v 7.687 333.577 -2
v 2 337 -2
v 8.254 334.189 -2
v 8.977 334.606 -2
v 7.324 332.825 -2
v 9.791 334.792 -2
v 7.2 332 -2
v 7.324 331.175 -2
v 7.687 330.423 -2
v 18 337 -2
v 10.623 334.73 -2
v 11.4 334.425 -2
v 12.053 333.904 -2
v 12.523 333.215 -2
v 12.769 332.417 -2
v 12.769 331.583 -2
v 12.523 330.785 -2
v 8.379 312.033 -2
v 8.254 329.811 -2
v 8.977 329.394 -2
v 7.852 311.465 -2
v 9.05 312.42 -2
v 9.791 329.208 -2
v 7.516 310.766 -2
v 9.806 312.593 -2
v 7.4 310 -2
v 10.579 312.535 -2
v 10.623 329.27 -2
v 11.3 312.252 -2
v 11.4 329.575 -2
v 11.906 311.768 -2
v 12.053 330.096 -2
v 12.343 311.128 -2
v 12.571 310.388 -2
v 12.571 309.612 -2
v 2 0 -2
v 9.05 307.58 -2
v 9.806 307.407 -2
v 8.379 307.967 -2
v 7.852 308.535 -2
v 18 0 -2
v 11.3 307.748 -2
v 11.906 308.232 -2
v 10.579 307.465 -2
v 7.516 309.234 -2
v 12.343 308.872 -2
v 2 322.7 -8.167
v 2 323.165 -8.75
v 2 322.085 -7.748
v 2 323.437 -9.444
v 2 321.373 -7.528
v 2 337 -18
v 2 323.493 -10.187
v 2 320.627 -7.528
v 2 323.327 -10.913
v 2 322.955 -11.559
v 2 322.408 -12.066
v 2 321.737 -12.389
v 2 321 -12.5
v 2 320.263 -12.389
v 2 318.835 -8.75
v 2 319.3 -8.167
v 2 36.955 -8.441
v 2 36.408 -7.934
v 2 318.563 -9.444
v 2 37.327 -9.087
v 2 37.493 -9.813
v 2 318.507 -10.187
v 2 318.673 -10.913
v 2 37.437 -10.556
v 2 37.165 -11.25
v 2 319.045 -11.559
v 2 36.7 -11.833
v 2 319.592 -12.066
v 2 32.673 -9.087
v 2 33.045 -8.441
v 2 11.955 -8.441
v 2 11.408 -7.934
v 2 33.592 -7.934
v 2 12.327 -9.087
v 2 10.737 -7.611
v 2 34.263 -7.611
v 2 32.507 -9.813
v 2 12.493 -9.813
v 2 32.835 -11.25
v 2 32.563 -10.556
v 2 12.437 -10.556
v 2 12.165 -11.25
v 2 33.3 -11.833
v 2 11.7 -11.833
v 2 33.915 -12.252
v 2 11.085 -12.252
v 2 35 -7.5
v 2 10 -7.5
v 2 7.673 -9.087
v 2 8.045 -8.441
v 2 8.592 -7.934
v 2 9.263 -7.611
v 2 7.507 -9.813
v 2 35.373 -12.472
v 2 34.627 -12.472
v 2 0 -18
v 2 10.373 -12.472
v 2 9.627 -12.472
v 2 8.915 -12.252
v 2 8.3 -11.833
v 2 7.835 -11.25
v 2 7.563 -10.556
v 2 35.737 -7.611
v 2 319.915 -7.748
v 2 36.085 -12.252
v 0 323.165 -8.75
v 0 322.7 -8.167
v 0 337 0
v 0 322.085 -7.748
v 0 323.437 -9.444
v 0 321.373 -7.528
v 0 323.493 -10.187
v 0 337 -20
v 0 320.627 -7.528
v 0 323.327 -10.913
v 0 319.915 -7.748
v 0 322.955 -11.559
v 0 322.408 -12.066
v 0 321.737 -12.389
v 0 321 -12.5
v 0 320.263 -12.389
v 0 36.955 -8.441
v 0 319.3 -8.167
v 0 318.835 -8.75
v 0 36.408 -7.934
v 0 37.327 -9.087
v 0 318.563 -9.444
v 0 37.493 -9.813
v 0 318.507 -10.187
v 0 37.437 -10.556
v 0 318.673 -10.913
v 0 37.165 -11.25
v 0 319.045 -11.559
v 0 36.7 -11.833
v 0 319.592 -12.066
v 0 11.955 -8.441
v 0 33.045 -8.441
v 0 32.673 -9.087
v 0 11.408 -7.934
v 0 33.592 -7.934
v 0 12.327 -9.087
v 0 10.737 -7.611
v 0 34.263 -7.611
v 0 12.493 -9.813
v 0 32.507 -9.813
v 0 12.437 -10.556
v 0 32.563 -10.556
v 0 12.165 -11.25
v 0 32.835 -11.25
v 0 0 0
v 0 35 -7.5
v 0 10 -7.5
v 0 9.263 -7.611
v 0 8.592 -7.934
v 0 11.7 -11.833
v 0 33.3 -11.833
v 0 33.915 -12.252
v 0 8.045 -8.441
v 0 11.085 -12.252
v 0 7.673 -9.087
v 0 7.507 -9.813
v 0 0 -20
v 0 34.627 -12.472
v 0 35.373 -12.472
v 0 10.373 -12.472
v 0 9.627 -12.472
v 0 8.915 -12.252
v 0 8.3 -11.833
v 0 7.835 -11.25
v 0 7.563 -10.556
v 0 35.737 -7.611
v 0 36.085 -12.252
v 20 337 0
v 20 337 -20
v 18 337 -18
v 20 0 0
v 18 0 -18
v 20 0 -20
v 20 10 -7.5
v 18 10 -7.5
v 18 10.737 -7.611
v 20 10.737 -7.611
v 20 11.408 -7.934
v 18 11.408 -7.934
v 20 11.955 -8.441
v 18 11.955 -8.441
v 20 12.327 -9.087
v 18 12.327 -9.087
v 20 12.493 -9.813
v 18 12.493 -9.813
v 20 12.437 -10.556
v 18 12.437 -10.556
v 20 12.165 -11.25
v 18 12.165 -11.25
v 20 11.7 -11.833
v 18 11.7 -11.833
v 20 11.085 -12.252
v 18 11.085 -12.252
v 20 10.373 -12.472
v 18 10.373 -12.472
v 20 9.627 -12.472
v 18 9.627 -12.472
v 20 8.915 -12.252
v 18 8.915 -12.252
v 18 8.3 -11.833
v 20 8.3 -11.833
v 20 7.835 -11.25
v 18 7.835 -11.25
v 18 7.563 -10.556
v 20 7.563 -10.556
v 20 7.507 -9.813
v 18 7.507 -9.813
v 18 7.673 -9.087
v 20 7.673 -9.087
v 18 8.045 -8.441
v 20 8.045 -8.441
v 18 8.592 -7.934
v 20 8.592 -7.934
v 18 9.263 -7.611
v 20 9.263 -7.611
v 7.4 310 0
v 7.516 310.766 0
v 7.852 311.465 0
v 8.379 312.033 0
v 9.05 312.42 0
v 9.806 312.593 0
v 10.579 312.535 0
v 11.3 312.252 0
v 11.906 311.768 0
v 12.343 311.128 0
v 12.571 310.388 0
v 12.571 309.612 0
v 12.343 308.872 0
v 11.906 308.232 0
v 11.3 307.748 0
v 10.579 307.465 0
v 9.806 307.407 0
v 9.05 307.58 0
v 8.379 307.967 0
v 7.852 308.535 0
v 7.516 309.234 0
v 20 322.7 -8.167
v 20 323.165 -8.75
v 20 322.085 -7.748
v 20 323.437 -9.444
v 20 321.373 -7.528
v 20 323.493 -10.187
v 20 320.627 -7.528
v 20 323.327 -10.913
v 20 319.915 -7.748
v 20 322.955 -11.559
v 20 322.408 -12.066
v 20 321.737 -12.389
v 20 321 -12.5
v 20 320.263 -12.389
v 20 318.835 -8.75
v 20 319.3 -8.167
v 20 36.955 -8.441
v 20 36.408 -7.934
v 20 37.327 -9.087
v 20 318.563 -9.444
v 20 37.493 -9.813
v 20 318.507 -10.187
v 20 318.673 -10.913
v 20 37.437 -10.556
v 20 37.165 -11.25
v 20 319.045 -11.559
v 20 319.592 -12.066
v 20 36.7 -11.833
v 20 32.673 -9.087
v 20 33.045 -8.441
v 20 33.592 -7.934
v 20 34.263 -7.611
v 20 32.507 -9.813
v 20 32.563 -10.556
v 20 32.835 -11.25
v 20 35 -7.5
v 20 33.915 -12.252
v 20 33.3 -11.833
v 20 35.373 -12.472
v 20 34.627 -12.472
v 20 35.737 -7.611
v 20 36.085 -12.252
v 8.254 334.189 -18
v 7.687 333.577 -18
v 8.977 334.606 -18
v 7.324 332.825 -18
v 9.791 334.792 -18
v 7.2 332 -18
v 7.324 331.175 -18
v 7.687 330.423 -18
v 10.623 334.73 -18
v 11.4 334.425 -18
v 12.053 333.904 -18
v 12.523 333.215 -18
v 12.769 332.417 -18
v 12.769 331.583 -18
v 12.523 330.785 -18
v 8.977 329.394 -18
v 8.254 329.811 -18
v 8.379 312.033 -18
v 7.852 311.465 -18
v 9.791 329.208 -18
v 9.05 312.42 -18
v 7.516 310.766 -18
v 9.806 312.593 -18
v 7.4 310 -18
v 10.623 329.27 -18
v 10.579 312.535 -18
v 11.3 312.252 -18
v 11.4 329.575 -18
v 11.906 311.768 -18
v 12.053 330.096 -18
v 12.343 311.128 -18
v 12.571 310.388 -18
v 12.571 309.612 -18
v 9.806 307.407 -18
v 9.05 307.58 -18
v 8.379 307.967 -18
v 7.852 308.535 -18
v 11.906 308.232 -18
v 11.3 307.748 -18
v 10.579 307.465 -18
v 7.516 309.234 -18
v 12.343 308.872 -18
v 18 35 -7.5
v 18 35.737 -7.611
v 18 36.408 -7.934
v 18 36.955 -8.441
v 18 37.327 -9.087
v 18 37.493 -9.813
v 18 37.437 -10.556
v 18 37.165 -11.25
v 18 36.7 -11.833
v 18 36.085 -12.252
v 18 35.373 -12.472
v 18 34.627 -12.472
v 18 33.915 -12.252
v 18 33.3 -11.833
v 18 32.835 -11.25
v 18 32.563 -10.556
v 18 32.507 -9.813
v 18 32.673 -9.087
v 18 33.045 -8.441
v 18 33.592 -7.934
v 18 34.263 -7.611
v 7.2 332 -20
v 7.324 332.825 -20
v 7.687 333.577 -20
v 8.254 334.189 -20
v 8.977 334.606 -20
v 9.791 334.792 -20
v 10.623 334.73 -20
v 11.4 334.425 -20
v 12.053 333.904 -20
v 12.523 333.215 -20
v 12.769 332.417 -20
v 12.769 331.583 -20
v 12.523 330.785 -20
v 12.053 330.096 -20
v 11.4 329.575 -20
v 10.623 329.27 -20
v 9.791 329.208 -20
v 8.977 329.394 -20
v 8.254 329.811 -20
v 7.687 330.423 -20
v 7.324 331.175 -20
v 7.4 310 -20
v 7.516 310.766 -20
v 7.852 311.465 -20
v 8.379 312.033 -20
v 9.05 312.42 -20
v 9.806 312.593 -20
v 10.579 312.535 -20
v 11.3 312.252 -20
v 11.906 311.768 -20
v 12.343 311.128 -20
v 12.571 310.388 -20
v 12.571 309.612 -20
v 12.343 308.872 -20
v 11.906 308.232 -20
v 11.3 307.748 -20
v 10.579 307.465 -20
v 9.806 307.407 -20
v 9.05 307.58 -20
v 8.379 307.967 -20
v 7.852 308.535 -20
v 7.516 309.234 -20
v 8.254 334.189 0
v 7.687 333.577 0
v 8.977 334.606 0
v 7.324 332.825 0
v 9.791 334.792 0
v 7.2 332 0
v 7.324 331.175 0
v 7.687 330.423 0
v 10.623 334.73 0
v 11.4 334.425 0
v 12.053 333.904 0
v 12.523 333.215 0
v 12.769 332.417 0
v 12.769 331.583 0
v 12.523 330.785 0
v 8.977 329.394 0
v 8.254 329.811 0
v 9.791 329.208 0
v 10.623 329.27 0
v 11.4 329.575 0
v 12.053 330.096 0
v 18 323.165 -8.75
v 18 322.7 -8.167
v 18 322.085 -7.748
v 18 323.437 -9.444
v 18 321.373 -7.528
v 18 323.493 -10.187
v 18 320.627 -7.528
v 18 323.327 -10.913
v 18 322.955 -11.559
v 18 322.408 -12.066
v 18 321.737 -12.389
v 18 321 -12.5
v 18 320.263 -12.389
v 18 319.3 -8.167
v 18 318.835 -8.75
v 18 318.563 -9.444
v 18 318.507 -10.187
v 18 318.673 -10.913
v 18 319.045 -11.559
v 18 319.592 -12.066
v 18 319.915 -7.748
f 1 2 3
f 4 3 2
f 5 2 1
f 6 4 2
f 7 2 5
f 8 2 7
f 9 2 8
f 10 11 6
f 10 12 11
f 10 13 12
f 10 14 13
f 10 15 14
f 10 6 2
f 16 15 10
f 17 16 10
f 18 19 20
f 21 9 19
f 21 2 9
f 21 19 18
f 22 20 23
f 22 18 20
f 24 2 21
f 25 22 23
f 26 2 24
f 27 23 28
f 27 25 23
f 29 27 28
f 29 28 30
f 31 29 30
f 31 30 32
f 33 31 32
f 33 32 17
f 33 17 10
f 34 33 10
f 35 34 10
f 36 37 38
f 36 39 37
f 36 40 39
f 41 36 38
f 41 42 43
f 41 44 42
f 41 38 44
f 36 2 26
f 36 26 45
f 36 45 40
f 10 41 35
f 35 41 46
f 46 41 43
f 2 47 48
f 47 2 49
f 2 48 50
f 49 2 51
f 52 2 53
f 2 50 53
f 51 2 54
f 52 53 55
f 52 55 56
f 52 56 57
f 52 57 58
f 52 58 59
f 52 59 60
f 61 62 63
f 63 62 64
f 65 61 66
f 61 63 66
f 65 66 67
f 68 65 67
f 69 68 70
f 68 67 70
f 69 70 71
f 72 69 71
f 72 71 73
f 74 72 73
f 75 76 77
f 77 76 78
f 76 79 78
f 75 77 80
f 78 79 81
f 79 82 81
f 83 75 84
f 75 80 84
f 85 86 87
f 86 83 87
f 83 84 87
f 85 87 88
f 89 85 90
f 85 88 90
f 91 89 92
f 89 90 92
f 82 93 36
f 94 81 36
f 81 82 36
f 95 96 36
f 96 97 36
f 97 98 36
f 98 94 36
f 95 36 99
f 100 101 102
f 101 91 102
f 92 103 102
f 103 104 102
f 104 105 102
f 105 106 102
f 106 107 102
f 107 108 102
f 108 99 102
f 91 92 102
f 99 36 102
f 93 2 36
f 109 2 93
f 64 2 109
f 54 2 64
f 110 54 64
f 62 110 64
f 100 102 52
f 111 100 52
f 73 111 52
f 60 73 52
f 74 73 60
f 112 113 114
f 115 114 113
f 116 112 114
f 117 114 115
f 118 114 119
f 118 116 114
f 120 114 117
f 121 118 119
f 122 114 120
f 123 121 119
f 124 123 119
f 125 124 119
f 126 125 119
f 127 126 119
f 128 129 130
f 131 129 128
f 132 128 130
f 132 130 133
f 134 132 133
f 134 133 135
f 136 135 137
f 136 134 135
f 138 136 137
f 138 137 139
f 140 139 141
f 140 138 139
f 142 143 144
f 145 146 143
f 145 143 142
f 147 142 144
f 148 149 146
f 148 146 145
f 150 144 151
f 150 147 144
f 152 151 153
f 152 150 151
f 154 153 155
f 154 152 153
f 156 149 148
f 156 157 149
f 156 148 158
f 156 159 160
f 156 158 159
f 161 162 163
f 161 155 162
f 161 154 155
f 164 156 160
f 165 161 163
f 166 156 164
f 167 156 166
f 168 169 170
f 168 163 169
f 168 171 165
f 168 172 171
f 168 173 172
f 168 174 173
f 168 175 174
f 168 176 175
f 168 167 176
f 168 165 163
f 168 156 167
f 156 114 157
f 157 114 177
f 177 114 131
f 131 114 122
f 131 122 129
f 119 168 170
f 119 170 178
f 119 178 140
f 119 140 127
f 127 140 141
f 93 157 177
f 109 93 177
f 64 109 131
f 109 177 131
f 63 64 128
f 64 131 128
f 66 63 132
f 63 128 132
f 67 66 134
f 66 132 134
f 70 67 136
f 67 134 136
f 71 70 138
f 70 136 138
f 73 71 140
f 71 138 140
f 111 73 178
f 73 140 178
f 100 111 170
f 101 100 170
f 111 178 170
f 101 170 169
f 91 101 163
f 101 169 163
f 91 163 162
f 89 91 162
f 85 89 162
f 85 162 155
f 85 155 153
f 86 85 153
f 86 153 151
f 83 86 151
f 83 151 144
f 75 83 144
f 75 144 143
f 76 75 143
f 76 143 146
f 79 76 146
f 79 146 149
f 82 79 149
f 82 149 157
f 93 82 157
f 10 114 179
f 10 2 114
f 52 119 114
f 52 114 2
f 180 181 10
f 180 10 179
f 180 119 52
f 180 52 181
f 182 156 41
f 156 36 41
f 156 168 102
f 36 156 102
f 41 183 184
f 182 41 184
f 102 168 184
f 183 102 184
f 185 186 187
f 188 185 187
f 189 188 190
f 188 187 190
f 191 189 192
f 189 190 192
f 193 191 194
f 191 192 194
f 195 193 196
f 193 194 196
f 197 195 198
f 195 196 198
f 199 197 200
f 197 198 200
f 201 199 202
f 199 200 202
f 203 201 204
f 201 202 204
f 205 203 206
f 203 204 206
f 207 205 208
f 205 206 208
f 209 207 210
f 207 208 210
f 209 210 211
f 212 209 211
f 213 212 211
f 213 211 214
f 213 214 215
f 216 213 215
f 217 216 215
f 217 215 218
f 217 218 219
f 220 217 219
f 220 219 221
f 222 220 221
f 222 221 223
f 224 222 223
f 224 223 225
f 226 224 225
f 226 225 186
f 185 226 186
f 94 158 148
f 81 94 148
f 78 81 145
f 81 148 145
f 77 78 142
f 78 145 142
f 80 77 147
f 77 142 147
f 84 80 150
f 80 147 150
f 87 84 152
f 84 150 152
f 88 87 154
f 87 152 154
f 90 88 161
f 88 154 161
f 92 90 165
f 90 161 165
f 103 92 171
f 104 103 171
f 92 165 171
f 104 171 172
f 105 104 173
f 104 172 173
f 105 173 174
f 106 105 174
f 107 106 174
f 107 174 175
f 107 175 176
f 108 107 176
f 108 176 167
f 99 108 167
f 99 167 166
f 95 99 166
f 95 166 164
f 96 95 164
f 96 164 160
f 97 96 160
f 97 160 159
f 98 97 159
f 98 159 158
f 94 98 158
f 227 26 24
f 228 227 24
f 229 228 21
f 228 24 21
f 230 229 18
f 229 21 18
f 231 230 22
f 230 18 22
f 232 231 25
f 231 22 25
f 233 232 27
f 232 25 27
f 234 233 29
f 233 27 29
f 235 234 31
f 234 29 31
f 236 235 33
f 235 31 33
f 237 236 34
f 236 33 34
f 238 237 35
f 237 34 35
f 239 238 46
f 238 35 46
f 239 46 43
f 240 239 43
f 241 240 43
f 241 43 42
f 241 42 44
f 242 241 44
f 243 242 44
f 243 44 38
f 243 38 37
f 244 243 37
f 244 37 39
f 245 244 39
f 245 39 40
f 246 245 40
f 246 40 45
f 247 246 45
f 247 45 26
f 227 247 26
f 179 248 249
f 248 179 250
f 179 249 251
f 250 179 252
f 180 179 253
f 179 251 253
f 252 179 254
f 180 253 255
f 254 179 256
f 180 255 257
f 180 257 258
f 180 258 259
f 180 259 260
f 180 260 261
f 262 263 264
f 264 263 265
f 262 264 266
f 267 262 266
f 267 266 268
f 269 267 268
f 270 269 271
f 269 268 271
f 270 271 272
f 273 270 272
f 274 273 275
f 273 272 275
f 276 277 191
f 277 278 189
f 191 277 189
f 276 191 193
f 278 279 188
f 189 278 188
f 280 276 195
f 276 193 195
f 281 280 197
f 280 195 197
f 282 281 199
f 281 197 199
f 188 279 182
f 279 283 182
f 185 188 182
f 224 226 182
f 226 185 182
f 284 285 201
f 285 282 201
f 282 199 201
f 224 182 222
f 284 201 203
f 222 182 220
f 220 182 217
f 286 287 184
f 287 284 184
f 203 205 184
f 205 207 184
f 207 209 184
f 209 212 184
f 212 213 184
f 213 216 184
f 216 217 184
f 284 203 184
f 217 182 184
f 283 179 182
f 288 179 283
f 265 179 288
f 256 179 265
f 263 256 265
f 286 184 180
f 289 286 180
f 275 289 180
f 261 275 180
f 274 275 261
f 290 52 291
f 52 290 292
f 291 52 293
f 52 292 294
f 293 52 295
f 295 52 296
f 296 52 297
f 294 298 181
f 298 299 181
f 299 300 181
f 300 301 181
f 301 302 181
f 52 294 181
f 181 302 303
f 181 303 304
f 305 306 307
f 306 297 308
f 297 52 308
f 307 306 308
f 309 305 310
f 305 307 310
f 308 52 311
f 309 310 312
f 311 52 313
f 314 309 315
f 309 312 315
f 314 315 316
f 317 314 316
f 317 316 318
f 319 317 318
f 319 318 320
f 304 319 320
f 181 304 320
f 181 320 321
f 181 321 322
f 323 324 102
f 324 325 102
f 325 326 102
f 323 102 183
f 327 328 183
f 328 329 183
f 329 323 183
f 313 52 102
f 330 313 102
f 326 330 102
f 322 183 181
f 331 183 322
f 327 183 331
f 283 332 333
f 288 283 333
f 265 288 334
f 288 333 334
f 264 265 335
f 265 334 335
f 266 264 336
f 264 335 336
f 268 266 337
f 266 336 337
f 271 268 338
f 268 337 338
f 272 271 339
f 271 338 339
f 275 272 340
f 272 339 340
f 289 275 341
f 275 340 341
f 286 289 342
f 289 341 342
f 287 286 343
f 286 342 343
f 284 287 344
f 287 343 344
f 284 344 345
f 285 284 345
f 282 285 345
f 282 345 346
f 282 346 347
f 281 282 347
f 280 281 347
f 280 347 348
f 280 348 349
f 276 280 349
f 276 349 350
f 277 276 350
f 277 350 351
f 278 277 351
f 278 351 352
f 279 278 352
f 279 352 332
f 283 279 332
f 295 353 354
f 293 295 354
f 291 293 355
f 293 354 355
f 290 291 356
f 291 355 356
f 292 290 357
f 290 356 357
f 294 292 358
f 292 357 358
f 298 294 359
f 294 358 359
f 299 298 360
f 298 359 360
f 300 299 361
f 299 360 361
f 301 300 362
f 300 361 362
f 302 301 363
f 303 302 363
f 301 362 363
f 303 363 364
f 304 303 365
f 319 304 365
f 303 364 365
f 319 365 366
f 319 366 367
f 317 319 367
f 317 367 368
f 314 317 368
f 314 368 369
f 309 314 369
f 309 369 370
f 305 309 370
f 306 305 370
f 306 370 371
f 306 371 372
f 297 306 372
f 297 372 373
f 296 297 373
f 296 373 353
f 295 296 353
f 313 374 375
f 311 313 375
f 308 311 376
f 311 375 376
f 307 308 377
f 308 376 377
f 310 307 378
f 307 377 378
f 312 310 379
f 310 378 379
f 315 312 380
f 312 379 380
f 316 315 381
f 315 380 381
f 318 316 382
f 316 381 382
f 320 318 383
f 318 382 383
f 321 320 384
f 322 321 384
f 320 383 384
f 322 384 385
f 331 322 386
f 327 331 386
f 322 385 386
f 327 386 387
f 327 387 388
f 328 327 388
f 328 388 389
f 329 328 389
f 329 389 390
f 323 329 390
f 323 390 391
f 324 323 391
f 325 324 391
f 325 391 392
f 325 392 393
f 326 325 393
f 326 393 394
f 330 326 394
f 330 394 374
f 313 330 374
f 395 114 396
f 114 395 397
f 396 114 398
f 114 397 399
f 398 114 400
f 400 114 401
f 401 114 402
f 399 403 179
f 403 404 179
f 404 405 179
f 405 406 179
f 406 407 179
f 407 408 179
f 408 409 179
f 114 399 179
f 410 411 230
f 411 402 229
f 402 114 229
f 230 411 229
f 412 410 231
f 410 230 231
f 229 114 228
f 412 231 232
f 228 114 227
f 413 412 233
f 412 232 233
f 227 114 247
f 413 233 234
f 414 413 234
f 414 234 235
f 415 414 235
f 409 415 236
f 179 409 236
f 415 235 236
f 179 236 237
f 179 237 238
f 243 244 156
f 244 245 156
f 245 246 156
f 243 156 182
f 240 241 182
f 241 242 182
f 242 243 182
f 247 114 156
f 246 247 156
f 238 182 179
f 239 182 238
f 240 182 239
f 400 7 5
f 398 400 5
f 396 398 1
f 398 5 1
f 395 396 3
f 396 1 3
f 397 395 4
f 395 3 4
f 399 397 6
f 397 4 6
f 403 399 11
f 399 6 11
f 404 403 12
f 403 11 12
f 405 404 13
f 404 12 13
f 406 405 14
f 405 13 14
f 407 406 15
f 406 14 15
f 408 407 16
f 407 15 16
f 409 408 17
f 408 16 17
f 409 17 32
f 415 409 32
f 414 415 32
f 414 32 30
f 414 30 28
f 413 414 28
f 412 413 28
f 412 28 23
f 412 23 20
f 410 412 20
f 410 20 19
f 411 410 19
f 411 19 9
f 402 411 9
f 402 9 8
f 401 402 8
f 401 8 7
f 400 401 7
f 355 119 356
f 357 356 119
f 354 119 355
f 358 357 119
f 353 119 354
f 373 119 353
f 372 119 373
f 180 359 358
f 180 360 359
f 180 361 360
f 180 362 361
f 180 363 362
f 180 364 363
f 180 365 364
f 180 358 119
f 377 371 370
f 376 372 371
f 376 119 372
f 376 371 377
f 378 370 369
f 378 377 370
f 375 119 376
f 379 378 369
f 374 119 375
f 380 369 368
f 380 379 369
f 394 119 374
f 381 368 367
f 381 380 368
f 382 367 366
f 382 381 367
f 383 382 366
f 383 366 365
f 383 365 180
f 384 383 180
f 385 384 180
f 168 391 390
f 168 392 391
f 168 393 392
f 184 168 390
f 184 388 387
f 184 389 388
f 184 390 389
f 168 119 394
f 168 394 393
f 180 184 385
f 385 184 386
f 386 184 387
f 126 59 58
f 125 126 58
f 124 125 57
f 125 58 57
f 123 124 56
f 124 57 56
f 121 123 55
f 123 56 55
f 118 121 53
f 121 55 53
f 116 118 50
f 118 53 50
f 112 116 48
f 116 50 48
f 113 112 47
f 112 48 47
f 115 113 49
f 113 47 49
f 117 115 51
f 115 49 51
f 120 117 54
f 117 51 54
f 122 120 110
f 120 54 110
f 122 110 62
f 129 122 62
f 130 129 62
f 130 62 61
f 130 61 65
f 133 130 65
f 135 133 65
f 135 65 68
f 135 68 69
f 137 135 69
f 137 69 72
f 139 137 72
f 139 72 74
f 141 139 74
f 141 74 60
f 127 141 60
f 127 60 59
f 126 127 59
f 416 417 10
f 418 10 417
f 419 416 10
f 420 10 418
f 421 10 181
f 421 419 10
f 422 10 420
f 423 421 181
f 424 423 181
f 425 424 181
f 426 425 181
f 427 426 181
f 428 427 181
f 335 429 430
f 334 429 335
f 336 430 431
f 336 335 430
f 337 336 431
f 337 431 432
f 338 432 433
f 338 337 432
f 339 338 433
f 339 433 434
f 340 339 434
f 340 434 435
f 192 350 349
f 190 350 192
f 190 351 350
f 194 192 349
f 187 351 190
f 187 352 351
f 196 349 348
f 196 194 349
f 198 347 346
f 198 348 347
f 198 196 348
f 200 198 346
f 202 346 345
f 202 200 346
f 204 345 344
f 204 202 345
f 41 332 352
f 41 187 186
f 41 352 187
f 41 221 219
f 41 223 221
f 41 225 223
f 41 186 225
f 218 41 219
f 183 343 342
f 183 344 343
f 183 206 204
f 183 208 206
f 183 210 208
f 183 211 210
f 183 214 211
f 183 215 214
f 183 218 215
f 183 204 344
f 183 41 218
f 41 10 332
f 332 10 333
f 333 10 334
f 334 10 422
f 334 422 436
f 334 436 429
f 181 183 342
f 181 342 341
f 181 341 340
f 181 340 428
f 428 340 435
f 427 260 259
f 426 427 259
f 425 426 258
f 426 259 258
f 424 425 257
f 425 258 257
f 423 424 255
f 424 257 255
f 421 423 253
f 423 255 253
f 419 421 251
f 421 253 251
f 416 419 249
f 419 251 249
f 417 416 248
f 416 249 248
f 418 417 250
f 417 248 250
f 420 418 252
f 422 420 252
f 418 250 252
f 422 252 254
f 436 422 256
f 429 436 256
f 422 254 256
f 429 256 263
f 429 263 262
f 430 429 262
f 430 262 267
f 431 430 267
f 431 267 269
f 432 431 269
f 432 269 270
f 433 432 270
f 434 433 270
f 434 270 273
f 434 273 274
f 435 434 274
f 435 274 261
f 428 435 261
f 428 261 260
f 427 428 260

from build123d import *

# Parameters (mm, degrees)
ESBO_O1_W             = 20
ESBO_O1_H             = 20
ESBO_O1_W_2           = 16
ESBO_O1_H_2           = 16
EXTRUS_O_FINA1_DEPTH  = 337
ESBO_O2_R             = 2.5
CORTE_EXTRUS_O1_DEPTH = 339.18486069
ESBO_O3_R             = 2.6
ESBO_O3_R_2           = 2.8
CORTE_EXTRUS_O2_DEPTH = 339.18486069
ESBO_O4_R             = 2.5
CORTE_EXTRUS_O3_DEPTH = 339.18486069


with BuildPart() as part:
    # Esboço1 → Extrusão-Fina1 (new body)
    with BuildSketch(Plane(origin=(0, 0, 0), x_dir=(1, 0, 0), z_dir=(0, 1, 0))):
        with Locations((10, 10)):
            Rectangle(ESBO_O1_W, ESBO_O1_H)
        with Locations((10, 10)):
            Rectangle(ESBO_O1_W_2, ESBO_O1_H_2, mode=Mode.SUBTRACT)
    extrude(amount=EXTRUS_O_FINA1_DEPTH)

    # Esboço2 → Corte-extrusão1 (cut, through all)
    with BuildSketch(Plane.ZY):
        with Locations((-10, 35)):
            Circle(ESBO_O2_R)
        with Locations((-10, 10)):
            Circle(ESBO_O2_R)
    extrude(amount=-CORTE_EXTRUS_O1_DEPTH, mode=Mode.SUBTRACT)

    # Esboço3 → Corte-extrusão2 (cut, through all)
    with BuildSketch(Plane(origin=(0, 0, -20), x_dir=(-1, 0, 0), z_dir=(0, 0, -1))):
        with Locations((-10, 310)):
            Circle(ESBO_O3_R)
        with Locations((-10, 332)):
            Circle(ESBO_O3_R_2)
    extrude(amount=-CORTE_EXTRUS_O2_DEPTH, mode=Mode.SUBTRACT)

    # Esboço4 → Corte-extrusão3 (cut, through all)
    with BuildSketch(Plane(origin=(20, 0, 0), x_dir=(0, 0, -1), z_dir=(1, 0, 0))):
        with Locations((10, 321)):
            Circle(ESBO_O4_R)
    extrude(amount=-CORTE_EXTRUS_O3_DEPTH, mode=Mode.SUBTRACT)


solid = part.part
